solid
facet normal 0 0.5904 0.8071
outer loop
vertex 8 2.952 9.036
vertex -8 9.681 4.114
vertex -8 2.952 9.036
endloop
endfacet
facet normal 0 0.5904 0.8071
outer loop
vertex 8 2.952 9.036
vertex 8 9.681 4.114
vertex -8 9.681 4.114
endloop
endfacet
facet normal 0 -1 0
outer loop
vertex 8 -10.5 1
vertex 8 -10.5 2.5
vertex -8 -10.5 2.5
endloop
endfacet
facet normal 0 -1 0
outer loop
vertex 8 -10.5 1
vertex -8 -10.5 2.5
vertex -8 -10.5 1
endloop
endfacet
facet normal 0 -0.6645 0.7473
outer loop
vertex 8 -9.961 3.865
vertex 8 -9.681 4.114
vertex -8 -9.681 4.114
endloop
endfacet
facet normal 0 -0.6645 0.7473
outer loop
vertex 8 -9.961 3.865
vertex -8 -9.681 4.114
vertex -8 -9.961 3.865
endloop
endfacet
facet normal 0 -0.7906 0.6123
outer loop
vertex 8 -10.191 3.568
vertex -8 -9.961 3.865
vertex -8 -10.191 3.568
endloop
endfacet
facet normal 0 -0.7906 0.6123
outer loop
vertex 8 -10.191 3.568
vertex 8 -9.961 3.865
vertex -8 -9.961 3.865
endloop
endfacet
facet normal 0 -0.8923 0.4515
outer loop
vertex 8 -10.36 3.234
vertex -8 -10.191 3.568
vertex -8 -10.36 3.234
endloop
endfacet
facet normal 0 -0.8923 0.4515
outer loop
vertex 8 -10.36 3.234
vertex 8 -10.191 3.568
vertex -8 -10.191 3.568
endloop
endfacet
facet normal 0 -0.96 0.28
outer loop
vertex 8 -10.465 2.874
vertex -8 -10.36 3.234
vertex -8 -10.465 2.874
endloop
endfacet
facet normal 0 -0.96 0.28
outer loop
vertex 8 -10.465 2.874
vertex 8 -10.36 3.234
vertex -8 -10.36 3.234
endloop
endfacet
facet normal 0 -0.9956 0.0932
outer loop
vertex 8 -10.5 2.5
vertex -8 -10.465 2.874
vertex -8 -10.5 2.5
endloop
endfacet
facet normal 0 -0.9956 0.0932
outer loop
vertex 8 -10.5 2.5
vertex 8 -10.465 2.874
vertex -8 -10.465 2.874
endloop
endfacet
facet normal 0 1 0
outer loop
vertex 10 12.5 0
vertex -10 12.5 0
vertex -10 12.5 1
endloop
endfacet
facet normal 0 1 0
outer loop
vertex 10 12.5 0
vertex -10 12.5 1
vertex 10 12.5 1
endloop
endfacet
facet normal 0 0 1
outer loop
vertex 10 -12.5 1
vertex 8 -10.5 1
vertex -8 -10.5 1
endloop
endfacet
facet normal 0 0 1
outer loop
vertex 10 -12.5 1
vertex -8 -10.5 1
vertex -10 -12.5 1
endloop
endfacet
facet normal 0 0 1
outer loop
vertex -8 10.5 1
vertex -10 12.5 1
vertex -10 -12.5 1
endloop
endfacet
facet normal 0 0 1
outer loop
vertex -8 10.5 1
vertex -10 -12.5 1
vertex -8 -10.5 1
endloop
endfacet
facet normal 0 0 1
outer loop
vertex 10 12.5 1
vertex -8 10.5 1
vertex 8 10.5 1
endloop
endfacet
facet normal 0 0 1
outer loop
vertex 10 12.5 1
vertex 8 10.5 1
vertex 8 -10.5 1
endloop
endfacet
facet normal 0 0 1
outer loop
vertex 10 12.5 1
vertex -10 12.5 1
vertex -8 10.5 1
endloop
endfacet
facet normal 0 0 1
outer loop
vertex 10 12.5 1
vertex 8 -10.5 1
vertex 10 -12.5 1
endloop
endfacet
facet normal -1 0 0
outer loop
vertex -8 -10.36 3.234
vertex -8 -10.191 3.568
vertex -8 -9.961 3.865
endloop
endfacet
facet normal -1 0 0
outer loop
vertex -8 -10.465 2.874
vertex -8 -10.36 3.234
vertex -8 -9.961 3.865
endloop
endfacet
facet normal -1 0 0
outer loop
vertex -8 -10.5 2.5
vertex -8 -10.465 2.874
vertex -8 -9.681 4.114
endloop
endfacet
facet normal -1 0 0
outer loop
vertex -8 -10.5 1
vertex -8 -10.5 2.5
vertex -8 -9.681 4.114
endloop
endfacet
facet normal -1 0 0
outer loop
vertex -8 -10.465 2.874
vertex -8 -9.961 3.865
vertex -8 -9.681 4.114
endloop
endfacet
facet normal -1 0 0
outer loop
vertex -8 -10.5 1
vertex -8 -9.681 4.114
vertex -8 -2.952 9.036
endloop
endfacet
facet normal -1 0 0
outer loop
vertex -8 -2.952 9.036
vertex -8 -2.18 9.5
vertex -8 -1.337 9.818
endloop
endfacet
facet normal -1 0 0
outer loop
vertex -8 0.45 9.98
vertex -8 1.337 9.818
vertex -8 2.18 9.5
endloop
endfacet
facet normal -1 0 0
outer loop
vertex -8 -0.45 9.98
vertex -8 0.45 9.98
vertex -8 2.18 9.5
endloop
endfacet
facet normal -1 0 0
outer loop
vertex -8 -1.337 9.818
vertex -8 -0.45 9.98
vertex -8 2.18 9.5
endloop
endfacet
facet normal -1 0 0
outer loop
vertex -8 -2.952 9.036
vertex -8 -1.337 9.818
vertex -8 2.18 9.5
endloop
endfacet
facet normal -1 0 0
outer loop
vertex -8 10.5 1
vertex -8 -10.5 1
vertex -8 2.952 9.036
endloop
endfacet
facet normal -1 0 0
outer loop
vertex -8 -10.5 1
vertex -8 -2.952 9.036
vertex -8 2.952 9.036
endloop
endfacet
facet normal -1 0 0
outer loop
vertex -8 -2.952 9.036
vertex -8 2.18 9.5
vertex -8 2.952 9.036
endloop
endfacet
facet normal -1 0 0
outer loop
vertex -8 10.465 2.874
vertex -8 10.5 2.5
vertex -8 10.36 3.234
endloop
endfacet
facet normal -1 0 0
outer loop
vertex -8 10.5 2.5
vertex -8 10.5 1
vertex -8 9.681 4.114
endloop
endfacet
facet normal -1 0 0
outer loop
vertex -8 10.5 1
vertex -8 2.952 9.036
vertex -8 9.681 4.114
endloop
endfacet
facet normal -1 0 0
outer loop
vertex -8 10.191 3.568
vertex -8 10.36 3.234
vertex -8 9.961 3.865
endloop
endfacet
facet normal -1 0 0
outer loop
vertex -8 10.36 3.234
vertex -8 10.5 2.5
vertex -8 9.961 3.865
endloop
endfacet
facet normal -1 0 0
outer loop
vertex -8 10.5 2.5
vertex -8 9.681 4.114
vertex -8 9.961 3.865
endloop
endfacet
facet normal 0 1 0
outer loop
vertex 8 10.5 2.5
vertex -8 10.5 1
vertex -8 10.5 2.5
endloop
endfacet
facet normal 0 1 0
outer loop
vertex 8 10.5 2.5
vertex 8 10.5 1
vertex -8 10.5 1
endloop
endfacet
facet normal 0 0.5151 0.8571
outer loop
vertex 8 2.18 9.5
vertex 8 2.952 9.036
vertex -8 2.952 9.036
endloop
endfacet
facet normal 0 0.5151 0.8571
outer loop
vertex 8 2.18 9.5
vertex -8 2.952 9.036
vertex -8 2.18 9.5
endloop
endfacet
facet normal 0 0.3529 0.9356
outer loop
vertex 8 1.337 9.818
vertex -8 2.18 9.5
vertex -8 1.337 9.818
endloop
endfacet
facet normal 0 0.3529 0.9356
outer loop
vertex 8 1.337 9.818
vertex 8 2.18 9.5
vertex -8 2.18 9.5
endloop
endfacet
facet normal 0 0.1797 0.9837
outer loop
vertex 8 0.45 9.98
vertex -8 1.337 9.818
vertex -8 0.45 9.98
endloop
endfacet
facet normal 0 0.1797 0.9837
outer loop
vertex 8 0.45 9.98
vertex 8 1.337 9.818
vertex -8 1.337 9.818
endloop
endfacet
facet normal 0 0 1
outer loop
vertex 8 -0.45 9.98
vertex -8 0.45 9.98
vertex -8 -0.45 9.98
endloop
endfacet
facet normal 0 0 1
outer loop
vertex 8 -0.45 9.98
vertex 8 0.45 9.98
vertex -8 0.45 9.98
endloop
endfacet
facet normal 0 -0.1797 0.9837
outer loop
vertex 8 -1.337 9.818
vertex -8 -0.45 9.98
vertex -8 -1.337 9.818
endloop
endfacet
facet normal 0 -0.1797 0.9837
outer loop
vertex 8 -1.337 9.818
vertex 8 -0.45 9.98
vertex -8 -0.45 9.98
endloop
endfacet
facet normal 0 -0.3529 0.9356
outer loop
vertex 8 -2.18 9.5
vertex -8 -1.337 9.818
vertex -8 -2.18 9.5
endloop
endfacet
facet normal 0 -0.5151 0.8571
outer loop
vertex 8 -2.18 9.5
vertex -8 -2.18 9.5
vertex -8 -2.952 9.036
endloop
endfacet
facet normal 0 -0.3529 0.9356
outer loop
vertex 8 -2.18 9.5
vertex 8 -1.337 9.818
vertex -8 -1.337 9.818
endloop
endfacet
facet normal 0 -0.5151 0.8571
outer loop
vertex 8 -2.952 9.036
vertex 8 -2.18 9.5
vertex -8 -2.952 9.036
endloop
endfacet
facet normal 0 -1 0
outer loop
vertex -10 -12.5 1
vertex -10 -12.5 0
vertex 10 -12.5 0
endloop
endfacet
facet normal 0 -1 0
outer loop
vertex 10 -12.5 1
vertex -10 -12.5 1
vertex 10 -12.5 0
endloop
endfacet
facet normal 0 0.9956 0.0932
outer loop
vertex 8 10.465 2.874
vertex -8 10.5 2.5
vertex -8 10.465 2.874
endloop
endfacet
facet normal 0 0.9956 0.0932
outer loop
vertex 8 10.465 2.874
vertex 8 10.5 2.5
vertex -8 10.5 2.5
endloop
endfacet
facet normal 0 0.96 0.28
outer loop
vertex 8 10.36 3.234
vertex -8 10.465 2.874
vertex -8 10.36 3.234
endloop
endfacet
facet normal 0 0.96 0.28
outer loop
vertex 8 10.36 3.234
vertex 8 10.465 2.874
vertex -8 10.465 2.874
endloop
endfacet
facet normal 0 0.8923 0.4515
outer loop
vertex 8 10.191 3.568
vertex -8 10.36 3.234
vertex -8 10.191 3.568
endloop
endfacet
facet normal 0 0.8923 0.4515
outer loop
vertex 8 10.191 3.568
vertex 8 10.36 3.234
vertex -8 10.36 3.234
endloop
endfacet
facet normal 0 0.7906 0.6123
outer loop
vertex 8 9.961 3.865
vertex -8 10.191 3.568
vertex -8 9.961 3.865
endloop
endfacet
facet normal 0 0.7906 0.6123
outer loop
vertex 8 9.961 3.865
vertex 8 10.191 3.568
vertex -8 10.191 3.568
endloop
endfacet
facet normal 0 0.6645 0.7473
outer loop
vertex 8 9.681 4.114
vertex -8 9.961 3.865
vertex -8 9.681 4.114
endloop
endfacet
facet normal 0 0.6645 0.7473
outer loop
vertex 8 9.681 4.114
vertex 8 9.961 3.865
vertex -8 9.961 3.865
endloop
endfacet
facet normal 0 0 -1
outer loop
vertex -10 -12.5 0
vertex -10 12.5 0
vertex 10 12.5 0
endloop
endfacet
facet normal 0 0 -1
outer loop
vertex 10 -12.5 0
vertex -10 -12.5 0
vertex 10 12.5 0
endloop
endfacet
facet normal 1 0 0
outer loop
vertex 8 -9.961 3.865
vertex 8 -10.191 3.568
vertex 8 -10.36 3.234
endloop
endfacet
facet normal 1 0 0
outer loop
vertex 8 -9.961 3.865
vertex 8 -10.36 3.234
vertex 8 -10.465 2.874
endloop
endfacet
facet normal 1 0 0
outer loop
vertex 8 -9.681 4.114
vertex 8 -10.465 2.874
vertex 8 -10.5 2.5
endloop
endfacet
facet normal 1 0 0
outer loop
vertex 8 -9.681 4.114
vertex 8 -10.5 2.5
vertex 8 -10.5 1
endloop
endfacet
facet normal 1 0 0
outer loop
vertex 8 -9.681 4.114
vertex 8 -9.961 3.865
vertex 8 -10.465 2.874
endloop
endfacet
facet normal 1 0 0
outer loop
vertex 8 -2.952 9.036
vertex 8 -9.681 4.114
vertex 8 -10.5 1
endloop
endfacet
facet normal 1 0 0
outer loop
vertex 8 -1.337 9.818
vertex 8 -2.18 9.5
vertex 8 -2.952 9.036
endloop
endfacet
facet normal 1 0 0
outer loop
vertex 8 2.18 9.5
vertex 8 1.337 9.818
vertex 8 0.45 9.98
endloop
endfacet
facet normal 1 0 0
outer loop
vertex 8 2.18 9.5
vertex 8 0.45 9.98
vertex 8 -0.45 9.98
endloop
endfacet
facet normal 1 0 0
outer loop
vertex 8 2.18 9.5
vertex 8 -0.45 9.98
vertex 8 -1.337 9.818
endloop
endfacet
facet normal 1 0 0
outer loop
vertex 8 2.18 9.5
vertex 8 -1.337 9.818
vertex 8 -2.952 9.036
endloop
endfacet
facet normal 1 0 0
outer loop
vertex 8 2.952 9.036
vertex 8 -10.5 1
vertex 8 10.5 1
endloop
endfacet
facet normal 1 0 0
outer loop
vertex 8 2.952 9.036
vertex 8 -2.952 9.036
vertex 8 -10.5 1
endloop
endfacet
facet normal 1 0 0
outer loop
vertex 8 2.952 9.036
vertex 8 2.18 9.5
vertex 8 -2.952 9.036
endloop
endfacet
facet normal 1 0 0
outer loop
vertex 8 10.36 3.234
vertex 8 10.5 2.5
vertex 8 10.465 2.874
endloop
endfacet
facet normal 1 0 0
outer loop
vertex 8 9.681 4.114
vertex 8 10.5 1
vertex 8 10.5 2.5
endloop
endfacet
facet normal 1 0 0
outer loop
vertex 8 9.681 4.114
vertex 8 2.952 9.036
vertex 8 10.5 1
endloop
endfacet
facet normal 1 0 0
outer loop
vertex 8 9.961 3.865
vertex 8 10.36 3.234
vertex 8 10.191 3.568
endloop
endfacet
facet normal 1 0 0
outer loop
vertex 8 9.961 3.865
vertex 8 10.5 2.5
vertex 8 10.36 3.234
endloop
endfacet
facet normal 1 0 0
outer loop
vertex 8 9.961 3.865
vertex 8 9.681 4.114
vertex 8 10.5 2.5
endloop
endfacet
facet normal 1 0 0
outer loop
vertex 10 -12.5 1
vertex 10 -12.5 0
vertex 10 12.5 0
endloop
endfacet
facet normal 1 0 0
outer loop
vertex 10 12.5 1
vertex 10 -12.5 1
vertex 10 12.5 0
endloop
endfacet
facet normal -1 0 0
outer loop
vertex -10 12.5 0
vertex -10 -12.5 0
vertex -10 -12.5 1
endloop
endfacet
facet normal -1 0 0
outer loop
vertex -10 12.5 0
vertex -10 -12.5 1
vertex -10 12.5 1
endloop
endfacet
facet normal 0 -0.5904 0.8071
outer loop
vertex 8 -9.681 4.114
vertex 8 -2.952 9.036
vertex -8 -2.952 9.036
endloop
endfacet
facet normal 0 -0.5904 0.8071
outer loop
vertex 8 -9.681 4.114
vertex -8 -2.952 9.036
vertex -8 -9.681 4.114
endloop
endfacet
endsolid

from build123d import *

# Parameters (mm, degrees)
F0_W     = 20
F0_H     = 25
F1_DEPTH = 1
F3_DEPTH = 8


with BuildPart() as f1:
    # F0 (on Top) → F1 (new body)
    with BuildSketch(Plane.XY):
        Rectangle(F0_W, F0_H)
    extrude(amount=F1_DEPTH)

    # F2 (on Right) → F3 (join, symmetric)
    with BuildSketch(Plane.YZ):
        with BuildLine():
            Line((9.680679, 4.11431), (2.951698, 9.035775))
            ThreePointArc((2.951698, 9.035775), (0, 10), (-2.951698, 9.035775))
            Line((-2.951698, 9.035775), (-9.680679, 4.11431))
            ThreePointArc((-9.680679, 4.11431), (-10.283446, 3.405163), (-10.5, 2.5))
            Line((-10.5, 2.5), (-10.5, 1))
            Line((-10.5, 1), (10.5, 1))
            Line((10.5, 1), (10.5, 2.5))
            ThreePointArc((10.5, 2.5), (10.283446, 3.405163), (9.680679, 4.11431))
        make_face()
    extrude(amount=F3_DEPTH, both=True)


solid = f1.part
